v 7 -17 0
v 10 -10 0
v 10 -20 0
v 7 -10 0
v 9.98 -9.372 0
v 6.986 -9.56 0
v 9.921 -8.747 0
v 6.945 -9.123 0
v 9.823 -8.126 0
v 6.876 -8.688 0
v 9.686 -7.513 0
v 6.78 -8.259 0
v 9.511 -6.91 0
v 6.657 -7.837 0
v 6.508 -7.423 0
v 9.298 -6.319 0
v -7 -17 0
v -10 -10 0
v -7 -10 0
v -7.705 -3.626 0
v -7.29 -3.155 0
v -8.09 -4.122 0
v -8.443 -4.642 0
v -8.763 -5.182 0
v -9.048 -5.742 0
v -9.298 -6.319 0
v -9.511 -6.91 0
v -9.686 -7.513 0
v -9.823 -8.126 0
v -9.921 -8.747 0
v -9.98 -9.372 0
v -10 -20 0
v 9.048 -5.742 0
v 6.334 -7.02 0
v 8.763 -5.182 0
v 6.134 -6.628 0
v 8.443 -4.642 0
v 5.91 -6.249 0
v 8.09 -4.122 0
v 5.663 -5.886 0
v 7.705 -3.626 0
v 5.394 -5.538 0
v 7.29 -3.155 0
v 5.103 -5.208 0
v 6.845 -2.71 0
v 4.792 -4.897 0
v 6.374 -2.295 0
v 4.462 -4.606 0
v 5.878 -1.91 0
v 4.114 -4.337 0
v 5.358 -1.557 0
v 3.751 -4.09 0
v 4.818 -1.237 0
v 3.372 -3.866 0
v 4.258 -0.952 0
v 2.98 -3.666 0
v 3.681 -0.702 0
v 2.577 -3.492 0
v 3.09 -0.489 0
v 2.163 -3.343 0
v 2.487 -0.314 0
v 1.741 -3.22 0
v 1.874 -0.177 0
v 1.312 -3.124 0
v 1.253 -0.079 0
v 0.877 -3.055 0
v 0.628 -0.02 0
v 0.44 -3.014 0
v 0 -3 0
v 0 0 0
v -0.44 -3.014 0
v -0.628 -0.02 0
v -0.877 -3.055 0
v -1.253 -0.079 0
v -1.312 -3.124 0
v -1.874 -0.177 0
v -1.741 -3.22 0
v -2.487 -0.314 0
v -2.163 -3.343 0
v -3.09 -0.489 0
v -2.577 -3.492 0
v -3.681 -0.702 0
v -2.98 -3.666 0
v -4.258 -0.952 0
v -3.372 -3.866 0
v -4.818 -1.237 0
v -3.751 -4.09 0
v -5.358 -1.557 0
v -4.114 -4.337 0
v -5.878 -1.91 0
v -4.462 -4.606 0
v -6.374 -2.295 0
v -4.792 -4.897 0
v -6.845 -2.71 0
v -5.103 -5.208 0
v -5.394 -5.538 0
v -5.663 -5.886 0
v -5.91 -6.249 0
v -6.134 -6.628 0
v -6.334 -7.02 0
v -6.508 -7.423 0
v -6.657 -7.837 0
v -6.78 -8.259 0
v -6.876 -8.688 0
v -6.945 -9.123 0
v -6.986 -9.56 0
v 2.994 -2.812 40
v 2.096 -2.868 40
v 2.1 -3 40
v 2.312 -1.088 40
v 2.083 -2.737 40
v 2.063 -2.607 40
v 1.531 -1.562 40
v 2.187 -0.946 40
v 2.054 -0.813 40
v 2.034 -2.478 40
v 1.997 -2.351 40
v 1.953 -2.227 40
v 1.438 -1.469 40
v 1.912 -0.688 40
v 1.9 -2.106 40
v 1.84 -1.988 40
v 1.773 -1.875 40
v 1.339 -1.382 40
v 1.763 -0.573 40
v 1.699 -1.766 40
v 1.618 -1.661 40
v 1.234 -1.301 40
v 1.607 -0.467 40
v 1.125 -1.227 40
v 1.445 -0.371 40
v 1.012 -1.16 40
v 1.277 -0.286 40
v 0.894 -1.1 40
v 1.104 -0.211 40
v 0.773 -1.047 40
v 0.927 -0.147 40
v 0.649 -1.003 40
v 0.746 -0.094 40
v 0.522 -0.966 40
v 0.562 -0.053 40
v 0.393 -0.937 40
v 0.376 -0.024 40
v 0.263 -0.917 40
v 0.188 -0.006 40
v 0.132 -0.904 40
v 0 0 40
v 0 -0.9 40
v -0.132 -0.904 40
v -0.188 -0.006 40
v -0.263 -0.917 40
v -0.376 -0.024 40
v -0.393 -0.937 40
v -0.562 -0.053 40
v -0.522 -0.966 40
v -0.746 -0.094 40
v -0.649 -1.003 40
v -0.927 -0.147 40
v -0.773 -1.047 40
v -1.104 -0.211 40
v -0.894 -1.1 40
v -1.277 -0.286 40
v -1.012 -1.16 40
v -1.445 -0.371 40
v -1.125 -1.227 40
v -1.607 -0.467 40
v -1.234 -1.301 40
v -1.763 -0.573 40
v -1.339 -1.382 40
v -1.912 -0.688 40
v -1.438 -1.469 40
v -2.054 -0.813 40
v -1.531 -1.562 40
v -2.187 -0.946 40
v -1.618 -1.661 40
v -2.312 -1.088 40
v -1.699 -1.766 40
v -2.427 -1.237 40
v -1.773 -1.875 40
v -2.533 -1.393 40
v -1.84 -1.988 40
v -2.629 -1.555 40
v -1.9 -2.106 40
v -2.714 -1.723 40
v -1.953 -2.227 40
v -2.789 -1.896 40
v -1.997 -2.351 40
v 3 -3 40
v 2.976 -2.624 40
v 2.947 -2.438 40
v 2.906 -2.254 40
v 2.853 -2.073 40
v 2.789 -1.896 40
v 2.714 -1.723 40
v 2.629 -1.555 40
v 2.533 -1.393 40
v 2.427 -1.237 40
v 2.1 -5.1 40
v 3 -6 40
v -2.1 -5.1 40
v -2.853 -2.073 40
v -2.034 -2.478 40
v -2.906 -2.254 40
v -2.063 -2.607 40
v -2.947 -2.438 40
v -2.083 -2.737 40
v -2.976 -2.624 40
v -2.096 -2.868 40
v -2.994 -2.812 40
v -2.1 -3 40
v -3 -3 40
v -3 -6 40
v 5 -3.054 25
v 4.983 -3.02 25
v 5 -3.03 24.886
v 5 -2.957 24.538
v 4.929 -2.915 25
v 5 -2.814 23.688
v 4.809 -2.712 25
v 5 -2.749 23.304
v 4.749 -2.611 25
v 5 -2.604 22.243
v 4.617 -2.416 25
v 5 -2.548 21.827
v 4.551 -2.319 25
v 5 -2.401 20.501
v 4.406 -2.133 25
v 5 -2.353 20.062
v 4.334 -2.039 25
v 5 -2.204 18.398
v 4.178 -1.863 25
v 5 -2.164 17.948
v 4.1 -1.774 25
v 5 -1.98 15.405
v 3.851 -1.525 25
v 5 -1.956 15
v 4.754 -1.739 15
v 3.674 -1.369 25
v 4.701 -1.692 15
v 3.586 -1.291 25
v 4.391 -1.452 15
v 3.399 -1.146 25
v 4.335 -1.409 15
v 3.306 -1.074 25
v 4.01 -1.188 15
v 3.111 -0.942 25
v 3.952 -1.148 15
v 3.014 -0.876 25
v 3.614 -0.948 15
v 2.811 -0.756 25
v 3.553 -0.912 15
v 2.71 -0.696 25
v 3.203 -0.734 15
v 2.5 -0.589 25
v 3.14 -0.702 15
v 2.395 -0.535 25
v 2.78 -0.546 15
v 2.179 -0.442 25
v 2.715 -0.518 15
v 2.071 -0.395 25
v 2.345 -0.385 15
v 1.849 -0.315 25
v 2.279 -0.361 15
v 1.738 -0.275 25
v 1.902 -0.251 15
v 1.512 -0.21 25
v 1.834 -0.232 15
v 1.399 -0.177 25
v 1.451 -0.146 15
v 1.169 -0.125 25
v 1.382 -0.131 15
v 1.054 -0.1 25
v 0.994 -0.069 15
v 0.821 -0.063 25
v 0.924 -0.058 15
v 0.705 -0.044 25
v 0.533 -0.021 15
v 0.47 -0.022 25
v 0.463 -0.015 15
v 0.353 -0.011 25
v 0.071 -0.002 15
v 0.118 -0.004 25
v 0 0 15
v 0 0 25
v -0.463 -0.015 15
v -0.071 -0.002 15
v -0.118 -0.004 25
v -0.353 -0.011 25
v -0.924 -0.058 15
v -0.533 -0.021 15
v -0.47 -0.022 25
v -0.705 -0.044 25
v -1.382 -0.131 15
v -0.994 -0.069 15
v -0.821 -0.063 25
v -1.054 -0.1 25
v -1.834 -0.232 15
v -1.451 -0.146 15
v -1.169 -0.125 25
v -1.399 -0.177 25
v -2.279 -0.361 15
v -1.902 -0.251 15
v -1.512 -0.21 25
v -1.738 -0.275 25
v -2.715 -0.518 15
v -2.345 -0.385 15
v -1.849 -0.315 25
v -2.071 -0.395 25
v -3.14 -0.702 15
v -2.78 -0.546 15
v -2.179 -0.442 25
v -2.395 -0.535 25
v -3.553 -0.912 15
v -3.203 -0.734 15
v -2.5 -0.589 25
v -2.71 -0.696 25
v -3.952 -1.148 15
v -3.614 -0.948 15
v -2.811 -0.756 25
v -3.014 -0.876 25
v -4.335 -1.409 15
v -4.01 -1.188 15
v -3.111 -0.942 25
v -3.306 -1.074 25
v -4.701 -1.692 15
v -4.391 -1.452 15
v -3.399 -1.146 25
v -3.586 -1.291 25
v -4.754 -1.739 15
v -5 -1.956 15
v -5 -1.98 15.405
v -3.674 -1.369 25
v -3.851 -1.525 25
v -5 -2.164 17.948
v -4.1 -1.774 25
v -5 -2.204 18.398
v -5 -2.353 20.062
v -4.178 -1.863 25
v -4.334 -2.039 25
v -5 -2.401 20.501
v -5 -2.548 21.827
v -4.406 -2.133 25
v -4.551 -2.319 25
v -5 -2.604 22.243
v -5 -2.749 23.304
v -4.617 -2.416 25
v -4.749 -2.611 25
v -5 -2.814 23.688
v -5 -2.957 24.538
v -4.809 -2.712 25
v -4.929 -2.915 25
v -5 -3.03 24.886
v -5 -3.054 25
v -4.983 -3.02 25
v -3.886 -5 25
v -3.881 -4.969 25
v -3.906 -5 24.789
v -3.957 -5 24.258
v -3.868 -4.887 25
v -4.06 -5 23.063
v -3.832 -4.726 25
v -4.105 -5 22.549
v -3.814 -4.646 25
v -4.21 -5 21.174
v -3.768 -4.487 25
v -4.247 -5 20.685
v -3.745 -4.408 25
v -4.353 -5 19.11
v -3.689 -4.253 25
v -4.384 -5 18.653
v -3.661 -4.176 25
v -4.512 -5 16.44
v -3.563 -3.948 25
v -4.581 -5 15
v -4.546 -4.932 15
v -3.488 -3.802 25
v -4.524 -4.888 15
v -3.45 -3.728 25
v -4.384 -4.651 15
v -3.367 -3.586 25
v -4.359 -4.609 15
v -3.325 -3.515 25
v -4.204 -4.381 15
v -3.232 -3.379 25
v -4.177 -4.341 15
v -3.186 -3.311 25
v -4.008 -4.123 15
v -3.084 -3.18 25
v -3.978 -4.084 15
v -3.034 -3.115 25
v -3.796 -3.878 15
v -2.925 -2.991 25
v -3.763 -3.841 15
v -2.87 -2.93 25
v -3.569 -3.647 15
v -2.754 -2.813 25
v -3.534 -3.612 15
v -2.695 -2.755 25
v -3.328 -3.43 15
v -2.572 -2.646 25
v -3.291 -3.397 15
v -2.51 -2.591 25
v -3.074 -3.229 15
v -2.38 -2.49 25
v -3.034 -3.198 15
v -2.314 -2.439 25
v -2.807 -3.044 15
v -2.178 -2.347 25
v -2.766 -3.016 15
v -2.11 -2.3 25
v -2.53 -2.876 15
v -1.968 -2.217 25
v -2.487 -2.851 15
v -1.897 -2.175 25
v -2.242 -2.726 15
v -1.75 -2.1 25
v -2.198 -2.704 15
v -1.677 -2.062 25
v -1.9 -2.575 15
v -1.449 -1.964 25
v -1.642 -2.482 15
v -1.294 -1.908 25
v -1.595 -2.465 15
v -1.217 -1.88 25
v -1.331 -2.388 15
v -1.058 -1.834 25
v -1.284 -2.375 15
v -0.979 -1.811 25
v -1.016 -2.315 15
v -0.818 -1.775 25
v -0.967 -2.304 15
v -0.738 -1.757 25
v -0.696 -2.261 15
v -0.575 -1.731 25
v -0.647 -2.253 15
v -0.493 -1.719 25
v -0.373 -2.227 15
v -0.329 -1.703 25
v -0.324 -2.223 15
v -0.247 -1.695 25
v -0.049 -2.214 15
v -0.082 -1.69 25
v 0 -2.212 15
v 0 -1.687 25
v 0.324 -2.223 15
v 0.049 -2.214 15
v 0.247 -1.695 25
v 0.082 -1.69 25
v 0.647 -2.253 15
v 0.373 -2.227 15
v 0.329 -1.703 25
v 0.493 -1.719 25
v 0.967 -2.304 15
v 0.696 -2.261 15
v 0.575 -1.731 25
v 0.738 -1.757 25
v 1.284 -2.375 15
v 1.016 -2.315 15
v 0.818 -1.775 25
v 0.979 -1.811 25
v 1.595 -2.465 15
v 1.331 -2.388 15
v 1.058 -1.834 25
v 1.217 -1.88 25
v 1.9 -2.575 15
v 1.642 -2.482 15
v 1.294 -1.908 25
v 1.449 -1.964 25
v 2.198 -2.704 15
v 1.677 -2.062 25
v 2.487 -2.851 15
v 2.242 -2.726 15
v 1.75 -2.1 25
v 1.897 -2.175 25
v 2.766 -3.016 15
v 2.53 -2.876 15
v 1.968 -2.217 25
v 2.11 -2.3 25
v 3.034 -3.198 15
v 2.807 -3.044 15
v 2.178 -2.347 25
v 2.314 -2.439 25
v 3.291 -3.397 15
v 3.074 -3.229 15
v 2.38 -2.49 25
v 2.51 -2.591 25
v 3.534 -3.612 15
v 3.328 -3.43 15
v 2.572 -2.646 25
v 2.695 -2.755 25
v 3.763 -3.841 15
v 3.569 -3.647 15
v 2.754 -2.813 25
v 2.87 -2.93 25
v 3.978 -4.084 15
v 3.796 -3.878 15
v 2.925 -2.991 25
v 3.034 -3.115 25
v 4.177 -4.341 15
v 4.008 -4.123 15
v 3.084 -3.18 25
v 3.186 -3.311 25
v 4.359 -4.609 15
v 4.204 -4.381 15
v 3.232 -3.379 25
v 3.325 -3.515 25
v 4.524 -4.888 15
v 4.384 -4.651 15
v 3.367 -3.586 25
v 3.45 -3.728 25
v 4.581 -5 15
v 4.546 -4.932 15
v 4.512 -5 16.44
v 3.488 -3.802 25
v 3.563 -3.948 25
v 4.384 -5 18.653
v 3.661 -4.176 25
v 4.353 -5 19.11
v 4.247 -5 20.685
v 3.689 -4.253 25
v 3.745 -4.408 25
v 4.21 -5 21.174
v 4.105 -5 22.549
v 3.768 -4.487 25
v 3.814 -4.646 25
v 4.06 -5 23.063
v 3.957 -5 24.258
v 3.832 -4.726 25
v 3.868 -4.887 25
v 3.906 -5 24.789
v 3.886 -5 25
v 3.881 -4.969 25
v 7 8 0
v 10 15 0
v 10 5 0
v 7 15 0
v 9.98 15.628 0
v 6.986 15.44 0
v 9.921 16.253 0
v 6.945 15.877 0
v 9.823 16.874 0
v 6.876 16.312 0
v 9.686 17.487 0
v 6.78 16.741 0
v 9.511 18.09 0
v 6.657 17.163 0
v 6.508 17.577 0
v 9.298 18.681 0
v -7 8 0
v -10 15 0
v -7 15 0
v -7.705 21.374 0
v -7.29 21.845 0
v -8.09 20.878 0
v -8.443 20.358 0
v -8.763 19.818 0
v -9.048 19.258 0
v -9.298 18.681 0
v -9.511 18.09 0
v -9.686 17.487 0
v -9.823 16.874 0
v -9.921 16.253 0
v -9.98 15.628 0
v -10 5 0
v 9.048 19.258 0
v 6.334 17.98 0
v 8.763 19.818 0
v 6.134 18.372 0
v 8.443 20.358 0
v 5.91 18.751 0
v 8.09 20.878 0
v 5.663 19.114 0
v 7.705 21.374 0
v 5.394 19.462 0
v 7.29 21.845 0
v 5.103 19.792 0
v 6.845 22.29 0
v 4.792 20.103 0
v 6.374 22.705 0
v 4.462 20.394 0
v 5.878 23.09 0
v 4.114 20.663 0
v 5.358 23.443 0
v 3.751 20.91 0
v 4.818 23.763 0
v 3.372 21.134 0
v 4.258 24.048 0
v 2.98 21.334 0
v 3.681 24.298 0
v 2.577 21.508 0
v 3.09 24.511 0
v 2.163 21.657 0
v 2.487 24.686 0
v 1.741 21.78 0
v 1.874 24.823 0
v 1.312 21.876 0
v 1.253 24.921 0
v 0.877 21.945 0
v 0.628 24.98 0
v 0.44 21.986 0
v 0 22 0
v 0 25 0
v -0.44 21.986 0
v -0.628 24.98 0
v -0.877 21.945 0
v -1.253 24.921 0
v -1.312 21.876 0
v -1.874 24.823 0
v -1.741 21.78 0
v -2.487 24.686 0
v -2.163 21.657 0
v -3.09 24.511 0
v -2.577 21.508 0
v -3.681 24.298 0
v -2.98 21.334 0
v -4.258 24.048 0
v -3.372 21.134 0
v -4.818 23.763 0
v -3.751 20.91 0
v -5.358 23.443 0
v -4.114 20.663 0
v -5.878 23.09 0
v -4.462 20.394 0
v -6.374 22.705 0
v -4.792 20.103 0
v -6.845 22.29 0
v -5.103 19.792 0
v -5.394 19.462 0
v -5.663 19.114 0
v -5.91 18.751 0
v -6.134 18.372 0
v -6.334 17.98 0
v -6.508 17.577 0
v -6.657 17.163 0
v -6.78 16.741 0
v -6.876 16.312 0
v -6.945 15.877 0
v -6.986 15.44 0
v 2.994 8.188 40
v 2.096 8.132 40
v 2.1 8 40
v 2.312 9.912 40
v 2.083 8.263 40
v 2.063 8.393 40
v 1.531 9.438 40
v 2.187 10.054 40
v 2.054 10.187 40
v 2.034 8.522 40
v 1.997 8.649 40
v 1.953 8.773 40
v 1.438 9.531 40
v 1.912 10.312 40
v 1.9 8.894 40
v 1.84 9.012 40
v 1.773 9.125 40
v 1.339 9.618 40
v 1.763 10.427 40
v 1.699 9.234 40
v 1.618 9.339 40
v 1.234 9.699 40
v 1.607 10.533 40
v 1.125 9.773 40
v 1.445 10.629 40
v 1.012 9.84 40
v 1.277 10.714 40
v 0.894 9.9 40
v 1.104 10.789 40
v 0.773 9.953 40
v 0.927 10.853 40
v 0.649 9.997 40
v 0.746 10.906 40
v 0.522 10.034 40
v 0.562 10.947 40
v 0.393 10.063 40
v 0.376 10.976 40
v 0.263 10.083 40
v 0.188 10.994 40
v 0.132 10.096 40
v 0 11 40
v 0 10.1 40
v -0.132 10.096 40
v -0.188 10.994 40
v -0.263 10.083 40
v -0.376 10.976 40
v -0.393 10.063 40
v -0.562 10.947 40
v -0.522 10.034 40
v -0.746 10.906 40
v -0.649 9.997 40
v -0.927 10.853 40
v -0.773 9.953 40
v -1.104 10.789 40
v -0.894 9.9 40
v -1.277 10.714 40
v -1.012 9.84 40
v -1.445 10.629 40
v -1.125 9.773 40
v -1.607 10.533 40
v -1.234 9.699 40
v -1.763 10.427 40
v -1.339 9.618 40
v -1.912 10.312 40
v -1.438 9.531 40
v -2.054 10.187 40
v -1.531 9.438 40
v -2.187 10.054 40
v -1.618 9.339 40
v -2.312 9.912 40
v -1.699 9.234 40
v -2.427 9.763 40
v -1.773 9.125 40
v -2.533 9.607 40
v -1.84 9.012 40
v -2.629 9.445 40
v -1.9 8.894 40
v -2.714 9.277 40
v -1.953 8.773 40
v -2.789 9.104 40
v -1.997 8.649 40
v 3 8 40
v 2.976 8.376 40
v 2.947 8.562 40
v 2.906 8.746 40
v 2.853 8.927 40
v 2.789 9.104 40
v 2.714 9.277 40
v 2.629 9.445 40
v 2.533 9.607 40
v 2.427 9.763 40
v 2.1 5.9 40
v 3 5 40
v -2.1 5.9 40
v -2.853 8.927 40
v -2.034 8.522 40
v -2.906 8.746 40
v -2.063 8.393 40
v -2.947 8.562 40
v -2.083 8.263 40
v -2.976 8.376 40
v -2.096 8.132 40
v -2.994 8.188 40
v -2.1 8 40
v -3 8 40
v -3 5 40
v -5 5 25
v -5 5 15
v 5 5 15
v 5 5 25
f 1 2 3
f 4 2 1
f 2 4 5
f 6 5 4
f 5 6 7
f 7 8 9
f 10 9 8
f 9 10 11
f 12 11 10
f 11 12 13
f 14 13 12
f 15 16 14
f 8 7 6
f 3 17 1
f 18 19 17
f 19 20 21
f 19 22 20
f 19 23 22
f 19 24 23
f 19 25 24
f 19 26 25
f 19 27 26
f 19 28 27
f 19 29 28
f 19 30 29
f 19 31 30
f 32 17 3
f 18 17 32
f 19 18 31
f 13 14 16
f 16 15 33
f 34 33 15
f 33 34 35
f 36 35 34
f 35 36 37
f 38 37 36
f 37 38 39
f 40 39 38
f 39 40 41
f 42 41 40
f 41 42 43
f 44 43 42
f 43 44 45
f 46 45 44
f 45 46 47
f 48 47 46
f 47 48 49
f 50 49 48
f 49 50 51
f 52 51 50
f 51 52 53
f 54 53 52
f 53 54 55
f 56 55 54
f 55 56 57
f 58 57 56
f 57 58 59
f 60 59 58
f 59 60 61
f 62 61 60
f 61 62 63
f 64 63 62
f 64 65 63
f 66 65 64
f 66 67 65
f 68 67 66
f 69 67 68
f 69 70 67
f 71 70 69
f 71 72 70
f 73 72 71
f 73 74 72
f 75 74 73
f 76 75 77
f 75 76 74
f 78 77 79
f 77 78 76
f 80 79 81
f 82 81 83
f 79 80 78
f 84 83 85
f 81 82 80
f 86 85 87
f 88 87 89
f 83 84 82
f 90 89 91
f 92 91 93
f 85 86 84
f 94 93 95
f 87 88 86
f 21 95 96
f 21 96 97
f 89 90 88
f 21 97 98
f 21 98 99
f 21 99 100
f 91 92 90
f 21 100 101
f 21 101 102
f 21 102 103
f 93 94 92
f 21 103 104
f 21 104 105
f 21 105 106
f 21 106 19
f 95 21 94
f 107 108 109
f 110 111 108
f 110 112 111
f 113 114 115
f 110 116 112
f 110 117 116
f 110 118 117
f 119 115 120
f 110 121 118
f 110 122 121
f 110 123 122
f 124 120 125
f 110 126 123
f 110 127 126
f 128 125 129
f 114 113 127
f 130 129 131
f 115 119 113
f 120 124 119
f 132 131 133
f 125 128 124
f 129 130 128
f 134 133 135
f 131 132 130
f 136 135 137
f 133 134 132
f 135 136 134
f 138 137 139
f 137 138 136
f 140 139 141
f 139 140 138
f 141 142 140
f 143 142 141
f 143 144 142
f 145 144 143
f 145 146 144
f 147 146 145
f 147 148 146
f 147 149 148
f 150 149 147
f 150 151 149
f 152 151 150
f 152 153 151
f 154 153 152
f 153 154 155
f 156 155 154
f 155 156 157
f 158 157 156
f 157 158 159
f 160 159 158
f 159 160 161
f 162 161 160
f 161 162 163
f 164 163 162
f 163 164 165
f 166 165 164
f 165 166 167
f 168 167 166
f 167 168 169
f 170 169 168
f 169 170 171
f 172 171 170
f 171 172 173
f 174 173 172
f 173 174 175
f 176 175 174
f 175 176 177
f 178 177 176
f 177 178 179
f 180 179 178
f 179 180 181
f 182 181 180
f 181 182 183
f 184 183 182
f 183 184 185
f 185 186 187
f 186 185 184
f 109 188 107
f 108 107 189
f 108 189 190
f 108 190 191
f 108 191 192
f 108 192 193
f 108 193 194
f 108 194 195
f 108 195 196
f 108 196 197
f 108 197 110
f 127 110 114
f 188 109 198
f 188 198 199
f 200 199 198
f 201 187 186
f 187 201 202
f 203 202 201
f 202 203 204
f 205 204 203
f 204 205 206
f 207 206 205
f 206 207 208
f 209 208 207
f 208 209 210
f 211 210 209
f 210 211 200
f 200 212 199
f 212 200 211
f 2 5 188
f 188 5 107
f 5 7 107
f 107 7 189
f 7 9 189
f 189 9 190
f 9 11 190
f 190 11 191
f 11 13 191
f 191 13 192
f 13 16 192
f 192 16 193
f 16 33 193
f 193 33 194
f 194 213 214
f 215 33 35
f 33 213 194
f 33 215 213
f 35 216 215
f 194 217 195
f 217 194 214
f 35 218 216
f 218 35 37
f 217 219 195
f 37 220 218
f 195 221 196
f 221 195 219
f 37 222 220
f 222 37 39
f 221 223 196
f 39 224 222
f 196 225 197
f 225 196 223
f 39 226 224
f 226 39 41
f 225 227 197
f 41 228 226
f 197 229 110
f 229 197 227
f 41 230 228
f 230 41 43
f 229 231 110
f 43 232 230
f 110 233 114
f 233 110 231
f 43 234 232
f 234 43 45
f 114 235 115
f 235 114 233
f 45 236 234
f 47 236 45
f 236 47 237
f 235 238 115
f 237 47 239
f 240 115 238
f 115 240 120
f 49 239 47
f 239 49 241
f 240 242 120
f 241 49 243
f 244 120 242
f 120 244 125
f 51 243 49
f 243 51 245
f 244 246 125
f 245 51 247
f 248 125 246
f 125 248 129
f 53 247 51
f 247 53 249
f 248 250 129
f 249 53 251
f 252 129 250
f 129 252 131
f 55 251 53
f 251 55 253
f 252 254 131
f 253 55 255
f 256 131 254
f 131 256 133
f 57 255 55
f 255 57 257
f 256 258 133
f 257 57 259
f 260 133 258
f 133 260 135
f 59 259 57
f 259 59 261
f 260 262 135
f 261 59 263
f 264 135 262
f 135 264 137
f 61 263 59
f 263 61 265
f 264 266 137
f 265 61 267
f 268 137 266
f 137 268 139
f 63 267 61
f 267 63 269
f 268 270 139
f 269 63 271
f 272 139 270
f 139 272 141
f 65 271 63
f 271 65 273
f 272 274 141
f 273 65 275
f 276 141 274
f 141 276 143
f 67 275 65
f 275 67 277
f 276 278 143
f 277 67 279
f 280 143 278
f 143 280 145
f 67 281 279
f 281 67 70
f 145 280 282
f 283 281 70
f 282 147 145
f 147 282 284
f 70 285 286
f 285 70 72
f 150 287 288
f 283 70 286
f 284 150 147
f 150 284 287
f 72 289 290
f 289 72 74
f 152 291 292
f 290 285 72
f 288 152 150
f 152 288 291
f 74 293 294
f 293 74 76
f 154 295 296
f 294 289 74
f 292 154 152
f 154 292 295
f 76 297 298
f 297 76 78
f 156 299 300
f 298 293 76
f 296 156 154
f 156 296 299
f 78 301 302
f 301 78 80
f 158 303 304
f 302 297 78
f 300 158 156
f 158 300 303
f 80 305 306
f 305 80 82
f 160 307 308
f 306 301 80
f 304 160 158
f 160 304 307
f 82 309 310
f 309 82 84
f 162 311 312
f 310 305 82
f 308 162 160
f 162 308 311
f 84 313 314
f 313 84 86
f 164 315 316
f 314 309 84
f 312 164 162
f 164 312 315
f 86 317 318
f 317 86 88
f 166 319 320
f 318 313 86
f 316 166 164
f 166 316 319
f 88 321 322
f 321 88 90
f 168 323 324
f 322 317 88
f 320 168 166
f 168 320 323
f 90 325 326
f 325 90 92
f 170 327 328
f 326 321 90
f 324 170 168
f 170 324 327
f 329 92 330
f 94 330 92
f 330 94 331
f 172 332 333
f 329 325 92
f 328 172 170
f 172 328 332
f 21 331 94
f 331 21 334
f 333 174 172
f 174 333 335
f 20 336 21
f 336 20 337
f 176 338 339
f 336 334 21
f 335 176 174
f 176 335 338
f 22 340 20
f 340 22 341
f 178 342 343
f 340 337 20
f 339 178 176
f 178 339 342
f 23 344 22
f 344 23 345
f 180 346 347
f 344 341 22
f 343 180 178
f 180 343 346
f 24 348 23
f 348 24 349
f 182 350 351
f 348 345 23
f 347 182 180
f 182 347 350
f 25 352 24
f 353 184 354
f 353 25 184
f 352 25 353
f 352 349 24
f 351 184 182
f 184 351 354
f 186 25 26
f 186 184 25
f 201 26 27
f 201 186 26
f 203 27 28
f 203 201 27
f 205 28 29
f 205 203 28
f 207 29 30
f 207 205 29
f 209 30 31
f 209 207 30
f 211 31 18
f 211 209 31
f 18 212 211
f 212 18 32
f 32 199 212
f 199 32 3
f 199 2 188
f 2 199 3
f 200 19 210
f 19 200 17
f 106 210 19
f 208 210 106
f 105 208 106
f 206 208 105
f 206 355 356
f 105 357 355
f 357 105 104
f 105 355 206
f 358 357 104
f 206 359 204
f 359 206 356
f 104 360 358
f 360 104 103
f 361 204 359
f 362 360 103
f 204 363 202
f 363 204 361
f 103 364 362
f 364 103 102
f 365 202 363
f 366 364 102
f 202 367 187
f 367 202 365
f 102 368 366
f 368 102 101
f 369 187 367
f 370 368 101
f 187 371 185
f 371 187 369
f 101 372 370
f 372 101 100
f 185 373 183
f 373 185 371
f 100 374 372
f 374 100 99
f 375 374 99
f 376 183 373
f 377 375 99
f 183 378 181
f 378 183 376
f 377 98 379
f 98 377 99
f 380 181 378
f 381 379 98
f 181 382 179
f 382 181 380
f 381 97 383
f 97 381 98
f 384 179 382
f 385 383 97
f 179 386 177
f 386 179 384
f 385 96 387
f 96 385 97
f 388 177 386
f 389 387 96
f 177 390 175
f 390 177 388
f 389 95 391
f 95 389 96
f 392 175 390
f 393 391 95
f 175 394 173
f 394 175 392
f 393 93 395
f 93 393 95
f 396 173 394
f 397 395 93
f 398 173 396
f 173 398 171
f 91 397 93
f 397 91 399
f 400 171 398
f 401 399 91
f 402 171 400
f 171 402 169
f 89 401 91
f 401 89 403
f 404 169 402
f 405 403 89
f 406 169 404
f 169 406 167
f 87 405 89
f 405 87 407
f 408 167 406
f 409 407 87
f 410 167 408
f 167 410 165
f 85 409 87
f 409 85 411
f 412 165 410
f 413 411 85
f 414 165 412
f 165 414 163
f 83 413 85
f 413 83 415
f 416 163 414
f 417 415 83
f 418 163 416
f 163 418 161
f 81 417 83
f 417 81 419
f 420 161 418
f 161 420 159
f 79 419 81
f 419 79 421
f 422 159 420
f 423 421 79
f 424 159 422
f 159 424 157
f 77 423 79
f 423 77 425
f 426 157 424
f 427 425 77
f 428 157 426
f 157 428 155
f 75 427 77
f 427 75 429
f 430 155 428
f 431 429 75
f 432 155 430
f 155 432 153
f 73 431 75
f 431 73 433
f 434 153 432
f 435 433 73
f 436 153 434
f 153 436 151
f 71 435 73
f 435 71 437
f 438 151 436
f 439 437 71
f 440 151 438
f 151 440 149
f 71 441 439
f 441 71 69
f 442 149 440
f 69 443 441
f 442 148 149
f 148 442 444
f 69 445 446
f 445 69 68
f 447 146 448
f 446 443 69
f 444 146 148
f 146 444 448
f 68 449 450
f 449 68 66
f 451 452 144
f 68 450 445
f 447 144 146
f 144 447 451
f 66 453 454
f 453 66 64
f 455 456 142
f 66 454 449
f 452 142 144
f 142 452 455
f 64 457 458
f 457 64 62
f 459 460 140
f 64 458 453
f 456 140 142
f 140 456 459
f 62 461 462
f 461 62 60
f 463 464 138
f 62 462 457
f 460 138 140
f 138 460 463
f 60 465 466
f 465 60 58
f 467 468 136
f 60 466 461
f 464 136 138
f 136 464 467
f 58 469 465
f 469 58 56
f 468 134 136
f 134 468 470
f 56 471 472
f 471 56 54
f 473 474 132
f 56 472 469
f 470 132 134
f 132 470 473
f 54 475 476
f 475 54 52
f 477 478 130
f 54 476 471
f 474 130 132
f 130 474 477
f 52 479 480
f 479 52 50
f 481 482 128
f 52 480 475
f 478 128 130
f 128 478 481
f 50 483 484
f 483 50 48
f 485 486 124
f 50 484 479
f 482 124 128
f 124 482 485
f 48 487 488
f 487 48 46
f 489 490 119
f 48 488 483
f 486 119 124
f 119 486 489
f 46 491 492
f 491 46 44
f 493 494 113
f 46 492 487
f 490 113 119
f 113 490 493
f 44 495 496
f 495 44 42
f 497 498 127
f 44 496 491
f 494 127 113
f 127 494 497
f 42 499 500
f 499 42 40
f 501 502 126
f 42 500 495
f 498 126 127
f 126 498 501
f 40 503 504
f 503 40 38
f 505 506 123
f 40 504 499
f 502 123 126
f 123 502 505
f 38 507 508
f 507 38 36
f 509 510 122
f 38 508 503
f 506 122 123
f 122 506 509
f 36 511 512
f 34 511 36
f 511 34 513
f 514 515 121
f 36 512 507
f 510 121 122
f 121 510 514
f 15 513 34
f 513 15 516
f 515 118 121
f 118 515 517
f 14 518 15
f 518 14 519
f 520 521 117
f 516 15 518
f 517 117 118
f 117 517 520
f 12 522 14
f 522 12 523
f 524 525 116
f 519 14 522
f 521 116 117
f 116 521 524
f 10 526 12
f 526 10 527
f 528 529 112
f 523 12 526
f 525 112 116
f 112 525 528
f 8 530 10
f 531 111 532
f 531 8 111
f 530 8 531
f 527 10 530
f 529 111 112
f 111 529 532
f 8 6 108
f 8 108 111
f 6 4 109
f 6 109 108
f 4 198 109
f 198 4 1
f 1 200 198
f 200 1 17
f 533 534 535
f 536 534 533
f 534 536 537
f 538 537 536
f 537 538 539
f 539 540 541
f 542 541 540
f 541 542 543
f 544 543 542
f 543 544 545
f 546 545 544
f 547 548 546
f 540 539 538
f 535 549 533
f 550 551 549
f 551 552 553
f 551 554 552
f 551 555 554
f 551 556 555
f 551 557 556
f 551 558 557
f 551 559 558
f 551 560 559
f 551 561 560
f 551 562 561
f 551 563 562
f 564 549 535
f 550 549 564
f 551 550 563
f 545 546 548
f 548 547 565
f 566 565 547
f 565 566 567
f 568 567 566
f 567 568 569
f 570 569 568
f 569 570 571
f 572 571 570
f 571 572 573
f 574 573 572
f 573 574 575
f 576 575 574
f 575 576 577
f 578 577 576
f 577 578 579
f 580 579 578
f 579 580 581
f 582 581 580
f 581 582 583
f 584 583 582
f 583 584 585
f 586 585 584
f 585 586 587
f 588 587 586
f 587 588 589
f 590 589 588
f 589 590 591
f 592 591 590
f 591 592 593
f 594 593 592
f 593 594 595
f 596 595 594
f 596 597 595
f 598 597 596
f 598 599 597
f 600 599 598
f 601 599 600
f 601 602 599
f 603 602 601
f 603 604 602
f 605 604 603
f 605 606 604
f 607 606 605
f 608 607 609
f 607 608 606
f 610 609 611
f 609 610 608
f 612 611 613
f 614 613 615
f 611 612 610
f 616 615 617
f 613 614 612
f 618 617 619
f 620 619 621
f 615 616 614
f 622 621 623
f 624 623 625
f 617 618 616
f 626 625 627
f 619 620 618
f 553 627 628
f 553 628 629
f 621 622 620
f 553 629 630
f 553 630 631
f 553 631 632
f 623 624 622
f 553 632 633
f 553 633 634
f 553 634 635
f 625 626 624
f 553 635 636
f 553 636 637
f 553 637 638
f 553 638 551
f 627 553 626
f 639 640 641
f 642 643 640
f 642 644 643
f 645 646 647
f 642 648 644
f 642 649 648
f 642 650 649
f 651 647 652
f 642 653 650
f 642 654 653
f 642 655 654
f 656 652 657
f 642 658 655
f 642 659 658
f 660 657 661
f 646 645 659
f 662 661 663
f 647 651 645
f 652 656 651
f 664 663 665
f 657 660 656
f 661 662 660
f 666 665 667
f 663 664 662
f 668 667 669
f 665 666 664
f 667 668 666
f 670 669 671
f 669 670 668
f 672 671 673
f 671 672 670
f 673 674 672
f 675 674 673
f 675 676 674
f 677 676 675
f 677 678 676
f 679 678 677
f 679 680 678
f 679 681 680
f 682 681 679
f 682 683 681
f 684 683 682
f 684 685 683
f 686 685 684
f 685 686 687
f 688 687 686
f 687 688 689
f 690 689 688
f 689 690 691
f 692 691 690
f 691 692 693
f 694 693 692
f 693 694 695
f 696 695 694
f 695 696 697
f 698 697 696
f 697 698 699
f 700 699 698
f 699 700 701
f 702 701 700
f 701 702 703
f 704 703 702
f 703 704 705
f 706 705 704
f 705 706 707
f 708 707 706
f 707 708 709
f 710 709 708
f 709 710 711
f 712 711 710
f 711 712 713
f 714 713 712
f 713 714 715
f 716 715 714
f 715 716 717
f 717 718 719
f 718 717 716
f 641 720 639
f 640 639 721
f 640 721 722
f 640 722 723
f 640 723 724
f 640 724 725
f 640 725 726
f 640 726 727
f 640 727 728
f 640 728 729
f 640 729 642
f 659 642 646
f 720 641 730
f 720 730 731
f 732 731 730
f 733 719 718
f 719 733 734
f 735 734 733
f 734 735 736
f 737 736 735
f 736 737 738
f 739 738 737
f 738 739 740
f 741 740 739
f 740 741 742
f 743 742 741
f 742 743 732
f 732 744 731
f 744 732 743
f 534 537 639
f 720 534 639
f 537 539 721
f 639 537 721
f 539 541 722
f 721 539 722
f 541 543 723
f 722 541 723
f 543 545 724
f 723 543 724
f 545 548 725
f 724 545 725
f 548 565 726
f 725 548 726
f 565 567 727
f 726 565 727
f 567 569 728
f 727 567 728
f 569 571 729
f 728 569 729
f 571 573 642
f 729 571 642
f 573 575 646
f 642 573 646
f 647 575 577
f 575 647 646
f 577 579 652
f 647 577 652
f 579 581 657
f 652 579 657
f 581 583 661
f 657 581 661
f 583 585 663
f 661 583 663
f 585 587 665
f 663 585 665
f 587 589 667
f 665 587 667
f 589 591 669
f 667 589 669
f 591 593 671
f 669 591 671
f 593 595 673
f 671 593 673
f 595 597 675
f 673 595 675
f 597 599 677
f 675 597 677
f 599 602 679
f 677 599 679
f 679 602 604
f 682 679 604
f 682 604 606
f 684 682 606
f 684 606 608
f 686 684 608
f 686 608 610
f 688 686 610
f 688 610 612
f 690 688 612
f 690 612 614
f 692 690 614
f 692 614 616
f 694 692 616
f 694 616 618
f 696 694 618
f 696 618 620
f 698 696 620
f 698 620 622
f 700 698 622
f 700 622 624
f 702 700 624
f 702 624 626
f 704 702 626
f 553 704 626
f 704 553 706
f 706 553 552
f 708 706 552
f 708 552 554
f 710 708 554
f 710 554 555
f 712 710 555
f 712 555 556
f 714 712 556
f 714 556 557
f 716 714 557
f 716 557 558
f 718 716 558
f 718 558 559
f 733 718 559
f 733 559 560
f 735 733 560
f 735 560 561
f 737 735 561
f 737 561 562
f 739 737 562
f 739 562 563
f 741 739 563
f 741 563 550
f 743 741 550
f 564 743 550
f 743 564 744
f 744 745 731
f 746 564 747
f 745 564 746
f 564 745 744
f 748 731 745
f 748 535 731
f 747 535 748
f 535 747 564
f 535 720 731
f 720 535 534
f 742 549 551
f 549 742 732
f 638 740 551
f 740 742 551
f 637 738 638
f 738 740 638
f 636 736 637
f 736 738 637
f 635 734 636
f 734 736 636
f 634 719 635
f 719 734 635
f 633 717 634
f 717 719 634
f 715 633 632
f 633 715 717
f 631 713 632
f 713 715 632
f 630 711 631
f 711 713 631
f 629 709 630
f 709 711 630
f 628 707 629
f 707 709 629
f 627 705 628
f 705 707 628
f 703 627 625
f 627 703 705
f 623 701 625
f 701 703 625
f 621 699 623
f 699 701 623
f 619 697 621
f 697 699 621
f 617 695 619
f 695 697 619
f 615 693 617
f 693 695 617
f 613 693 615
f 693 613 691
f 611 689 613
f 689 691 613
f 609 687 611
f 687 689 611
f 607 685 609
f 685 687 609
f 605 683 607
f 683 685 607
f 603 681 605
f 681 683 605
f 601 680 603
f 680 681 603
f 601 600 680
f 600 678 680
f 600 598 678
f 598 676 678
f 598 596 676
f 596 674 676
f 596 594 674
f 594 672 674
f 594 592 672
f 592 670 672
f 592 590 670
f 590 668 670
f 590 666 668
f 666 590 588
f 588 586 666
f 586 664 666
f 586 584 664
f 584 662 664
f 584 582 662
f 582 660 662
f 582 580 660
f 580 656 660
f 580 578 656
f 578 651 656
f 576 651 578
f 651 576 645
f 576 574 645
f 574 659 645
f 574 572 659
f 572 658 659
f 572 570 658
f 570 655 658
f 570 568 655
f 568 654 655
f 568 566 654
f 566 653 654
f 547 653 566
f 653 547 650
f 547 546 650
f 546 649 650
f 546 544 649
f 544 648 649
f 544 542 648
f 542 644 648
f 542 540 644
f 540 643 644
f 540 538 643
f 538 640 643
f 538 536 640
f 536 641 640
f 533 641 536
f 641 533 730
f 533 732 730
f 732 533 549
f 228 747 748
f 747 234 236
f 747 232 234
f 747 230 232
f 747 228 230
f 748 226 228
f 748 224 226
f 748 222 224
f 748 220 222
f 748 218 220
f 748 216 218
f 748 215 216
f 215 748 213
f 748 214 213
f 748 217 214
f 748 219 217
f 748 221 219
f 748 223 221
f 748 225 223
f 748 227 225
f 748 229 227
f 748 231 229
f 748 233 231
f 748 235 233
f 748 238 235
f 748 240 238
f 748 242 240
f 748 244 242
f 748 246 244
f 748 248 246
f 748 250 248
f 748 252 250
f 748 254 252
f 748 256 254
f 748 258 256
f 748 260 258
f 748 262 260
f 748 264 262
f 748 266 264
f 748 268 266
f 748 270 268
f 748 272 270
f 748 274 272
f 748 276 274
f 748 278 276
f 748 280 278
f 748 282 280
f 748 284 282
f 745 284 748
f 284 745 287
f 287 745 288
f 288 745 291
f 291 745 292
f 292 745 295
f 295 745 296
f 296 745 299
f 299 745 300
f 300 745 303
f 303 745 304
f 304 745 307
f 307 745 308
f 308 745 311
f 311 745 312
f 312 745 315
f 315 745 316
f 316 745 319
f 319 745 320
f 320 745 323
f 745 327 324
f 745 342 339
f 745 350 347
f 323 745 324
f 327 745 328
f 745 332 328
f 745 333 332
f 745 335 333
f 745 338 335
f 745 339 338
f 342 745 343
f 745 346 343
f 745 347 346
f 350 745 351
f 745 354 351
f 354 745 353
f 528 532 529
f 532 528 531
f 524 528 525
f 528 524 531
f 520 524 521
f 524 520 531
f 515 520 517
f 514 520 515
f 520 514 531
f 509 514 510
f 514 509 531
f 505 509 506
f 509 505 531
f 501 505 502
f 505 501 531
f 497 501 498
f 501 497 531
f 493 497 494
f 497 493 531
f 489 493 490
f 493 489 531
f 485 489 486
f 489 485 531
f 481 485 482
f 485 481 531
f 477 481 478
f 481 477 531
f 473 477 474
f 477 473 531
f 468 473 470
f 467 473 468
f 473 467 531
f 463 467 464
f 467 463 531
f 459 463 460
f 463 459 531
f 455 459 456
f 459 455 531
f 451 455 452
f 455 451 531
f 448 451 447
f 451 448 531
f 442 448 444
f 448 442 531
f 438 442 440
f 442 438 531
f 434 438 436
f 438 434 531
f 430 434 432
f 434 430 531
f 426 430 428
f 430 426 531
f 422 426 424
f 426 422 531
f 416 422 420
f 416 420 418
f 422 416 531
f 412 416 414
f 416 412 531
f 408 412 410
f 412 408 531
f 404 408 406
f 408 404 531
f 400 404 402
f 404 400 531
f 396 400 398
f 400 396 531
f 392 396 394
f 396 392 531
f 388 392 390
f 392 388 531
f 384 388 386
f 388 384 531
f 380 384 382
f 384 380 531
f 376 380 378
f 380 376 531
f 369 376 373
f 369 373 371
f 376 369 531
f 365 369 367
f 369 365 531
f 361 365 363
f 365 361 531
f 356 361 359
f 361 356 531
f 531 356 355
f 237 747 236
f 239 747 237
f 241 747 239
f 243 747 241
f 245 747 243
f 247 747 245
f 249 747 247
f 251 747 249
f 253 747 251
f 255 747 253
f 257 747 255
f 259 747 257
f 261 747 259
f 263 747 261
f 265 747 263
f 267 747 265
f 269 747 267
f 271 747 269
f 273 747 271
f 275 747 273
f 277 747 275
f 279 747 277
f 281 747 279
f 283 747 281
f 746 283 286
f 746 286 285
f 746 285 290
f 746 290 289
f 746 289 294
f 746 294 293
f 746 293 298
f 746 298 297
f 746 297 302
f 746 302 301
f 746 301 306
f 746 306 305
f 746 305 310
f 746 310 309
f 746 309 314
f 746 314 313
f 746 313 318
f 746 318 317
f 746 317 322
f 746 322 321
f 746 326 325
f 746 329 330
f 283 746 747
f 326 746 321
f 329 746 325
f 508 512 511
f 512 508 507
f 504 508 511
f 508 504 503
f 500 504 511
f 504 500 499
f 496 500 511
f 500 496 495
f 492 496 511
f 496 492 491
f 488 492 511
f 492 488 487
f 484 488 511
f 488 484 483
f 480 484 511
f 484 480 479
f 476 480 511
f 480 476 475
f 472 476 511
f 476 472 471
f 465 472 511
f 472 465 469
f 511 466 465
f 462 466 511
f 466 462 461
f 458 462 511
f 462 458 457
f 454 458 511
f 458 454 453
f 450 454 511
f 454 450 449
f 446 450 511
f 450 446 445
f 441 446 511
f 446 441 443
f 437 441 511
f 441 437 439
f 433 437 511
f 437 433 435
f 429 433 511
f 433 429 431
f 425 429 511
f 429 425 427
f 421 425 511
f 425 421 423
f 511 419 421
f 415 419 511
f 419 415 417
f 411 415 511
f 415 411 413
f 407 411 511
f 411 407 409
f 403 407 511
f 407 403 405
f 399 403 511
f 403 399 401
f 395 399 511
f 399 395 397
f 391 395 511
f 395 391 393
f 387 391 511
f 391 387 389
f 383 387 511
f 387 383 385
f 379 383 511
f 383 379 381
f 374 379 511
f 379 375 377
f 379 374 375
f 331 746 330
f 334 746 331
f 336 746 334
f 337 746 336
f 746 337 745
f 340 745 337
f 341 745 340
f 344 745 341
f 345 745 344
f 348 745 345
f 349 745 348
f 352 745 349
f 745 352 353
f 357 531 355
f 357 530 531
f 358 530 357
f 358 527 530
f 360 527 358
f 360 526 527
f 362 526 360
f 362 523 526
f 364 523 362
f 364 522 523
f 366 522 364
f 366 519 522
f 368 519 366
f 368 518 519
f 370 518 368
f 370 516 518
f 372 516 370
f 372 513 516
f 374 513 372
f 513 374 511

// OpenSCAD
$fn=100;
module D(size = 10){
circle(size);
translate([-size,-size,0]){
square([size*2,size]);
}
}


module long(tl = -10){
linear_extrude(40, scale=0.3){
translate([0,tl,0]){
difference(){
    D();
    
D(7);
}
}
}
}

long();
translate([0,5,0]){
    long(+10);
}

translate([0,0,20]){
cube([10,10,10], center=true);
}
